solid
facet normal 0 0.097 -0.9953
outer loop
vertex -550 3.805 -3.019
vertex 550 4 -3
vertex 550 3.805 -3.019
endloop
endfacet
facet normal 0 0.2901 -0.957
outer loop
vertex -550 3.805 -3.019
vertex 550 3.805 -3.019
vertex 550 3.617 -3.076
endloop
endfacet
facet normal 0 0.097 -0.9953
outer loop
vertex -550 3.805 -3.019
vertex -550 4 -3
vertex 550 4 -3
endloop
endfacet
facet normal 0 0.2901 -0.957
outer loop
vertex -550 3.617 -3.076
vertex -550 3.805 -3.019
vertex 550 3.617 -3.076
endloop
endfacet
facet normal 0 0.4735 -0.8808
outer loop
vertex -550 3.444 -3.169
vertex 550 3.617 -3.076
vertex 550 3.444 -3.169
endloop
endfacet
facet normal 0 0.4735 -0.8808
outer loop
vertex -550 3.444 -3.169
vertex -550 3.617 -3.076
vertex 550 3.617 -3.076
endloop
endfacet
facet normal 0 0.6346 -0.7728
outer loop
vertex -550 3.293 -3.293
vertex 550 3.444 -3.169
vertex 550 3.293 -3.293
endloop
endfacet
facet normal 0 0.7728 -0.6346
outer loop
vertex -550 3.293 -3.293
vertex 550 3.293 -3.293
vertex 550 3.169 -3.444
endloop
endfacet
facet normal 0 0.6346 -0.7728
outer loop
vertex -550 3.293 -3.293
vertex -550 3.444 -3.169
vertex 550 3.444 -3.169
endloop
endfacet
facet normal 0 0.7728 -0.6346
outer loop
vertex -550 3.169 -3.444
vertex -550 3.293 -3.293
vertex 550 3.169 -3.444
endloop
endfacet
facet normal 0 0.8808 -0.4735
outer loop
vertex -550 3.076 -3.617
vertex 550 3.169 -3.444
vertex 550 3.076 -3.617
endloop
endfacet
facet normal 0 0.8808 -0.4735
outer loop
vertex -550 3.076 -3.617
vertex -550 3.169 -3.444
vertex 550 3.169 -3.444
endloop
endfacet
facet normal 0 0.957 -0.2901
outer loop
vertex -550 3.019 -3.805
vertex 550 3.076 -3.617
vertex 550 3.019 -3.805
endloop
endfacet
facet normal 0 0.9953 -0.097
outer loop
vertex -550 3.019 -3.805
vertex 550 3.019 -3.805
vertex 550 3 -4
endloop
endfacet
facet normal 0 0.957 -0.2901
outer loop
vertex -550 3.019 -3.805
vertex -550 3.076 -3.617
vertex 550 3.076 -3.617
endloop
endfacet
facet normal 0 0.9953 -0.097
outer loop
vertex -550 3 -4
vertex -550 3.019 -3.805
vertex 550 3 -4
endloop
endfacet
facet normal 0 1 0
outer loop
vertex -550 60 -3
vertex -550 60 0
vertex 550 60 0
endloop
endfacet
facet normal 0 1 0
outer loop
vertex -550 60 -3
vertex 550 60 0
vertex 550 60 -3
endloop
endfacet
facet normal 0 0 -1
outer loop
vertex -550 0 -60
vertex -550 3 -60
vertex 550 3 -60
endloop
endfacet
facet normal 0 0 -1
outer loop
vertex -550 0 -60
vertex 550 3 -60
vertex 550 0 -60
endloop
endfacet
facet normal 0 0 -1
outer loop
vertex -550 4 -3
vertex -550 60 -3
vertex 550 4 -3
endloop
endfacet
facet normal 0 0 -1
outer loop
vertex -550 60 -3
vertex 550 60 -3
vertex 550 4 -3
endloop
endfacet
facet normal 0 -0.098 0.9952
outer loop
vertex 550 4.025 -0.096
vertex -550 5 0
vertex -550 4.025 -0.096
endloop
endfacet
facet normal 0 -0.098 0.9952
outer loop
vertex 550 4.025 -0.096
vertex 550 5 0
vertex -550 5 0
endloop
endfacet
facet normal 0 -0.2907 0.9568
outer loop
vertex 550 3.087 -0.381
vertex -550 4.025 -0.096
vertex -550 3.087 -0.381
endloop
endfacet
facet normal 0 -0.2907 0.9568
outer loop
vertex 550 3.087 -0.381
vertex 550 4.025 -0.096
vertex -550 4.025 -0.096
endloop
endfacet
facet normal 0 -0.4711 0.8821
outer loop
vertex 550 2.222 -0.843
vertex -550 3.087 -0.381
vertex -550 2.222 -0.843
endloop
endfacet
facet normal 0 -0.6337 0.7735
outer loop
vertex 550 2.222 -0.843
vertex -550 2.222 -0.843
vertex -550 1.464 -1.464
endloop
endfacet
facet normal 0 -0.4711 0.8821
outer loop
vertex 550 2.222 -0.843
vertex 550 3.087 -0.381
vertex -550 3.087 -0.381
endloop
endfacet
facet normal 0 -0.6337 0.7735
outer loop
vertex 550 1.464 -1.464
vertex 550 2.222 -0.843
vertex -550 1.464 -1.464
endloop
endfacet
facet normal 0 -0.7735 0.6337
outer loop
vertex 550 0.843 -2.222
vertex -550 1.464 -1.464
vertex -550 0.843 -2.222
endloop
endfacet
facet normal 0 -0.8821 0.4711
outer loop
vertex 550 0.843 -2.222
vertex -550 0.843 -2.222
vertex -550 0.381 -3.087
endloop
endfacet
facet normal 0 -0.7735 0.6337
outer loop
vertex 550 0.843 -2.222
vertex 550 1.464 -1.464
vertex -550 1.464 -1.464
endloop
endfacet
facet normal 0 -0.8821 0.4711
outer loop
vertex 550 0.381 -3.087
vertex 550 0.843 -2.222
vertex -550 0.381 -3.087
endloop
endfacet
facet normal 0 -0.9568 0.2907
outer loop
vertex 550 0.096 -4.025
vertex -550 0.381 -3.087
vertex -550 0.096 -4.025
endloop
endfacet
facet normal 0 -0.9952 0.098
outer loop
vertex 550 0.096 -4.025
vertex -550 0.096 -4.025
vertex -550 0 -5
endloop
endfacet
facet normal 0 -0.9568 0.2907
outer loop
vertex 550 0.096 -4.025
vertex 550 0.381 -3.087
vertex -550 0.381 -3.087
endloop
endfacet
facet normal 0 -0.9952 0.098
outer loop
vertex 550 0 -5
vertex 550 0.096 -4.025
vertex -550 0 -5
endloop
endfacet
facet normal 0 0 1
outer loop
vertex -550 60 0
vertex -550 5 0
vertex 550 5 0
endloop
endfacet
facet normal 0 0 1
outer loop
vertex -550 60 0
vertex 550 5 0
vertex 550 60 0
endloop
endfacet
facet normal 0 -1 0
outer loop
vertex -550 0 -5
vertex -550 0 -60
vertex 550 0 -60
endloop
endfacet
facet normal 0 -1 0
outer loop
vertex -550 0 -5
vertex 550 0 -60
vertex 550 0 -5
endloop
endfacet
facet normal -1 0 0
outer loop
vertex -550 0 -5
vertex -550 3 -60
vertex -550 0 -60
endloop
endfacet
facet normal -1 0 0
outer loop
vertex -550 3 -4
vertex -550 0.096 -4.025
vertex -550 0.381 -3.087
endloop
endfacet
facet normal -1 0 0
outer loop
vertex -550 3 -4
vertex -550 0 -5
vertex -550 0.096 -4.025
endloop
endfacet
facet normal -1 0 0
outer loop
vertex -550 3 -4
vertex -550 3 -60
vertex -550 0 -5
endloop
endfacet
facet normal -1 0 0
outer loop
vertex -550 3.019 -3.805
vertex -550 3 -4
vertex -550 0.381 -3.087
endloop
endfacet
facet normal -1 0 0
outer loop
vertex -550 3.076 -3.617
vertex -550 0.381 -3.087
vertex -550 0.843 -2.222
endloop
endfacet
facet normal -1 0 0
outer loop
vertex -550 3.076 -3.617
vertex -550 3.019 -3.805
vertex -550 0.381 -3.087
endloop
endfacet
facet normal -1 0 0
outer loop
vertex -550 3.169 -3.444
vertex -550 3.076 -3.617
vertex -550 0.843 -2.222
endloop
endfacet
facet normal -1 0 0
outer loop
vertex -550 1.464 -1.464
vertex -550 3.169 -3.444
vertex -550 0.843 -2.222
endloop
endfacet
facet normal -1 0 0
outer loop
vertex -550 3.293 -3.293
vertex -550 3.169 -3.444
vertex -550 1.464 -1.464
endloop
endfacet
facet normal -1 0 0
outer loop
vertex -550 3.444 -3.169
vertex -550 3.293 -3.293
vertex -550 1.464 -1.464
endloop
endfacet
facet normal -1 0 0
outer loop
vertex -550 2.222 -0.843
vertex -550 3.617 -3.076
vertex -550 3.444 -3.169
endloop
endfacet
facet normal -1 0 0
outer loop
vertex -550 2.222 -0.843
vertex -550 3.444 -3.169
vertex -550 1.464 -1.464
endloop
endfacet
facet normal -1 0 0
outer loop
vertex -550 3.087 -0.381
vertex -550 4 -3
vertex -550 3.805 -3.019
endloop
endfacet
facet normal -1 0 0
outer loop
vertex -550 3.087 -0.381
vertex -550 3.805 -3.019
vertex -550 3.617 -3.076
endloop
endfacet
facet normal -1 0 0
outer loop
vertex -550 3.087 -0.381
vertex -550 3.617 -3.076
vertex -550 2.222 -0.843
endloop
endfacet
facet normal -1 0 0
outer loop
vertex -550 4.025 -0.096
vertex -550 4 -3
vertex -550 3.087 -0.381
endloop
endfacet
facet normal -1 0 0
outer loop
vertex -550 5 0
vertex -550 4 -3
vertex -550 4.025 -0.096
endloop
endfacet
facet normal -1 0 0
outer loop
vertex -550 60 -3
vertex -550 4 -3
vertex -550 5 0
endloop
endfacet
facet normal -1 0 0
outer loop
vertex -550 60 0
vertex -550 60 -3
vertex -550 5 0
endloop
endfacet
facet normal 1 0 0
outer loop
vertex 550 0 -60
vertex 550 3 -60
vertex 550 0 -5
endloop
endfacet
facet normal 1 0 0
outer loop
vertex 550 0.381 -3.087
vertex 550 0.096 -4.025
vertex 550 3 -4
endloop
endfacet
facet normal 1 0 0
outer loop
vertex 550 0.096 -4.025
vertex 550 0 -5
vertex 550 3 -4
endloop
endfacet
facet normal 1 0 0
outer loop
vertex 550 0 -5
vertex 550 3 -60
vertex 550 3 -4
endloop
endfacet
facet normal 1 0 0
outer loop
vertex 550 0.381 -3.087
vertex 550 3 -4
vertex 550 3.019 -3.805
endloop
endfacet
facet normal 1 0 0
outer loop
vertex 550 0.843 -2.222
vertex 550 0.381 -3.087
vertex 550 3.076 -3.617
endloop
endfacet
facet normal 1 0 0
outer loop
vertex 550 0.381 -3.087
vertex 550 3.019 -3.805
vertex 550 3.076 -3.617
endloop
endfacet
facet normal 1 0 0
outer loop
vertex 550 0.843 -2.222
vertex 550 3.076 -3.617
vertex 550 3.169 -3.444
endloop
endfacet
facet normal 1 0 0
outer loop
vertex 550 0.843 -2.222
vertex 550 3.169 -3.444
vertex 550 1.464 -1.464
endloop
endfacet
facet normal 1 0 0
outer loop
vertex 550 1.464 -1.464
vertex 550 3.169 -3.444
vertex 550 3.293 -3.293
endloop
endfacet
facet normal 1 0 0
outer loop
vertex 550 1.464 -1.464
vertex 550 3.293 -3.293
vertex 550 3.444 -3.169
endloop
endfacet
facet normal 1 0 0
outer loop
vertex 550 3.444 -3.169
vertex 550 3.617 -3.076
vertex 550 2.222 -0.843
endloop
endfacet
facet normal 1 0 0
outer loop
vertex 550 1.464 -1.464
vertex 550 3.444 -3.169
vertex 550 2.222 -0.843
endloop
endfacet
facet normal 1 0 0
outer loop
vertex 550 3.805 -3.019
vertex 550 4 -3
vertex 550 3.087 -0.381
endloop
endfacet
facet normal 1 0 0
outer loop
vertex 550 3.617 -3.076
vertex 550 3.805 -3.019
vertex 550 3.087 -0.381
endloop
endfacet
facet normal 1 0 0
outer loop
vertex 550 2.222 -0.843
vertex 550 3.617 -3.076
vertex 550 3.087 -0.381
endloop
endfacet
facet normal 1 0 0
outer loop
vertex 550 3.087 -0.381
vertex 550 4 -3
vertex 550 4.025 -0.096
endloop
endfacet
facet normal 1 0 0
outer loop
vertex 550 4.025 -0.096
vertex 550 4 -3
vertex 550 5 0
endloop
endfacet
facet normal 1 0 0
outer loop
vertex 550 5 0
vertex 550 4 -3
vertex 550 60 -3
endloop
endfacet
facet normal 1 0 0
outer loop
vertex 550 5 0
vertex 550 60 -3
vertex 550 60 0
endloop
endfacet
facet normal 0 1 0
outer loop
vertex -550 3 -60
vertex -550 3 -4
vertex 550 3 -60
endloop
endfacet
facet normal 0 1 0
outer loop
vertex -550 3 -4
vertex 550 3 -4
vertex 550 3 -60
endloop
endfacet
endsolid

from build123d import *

# Parameters (mm, degrees)
BOSS_EXTRUDE1_DEPTH = 550
FILLET1_R           = 5
FILLET2_R           = 1


with BuildPart() as part:
    # Sketch1 → Boss-Extrude1 (new, symmetric)
    with BuildSketch(Plane(origin=(0, 0, 0), x_dir=(0, 0, -1), z_dir=(1, 0, 0))):
        Polygon((0, 0), (0, 60), (3, 60), (3, 3), (60, 3), (60, 0), align=None)
    extrude(amount=BOSS_EXTRUDE1_DEPTH, both=True)

    # Fillet1
    fillet1_edges = [part.edges().sort_by_distance(p)[0] for p in [
        (0, 0, 0),
    ]]
    fillet(fillet1_edges, radius=FILLET1_R)

    # Fillet2
    fillet2_edges = [part.edges().sort_by_distance(p)[0] for p in [
        (0, 3, -3),
    ]]
    fillet(fillet2_edges, radius=FILLET2_R)


solid = part.part
